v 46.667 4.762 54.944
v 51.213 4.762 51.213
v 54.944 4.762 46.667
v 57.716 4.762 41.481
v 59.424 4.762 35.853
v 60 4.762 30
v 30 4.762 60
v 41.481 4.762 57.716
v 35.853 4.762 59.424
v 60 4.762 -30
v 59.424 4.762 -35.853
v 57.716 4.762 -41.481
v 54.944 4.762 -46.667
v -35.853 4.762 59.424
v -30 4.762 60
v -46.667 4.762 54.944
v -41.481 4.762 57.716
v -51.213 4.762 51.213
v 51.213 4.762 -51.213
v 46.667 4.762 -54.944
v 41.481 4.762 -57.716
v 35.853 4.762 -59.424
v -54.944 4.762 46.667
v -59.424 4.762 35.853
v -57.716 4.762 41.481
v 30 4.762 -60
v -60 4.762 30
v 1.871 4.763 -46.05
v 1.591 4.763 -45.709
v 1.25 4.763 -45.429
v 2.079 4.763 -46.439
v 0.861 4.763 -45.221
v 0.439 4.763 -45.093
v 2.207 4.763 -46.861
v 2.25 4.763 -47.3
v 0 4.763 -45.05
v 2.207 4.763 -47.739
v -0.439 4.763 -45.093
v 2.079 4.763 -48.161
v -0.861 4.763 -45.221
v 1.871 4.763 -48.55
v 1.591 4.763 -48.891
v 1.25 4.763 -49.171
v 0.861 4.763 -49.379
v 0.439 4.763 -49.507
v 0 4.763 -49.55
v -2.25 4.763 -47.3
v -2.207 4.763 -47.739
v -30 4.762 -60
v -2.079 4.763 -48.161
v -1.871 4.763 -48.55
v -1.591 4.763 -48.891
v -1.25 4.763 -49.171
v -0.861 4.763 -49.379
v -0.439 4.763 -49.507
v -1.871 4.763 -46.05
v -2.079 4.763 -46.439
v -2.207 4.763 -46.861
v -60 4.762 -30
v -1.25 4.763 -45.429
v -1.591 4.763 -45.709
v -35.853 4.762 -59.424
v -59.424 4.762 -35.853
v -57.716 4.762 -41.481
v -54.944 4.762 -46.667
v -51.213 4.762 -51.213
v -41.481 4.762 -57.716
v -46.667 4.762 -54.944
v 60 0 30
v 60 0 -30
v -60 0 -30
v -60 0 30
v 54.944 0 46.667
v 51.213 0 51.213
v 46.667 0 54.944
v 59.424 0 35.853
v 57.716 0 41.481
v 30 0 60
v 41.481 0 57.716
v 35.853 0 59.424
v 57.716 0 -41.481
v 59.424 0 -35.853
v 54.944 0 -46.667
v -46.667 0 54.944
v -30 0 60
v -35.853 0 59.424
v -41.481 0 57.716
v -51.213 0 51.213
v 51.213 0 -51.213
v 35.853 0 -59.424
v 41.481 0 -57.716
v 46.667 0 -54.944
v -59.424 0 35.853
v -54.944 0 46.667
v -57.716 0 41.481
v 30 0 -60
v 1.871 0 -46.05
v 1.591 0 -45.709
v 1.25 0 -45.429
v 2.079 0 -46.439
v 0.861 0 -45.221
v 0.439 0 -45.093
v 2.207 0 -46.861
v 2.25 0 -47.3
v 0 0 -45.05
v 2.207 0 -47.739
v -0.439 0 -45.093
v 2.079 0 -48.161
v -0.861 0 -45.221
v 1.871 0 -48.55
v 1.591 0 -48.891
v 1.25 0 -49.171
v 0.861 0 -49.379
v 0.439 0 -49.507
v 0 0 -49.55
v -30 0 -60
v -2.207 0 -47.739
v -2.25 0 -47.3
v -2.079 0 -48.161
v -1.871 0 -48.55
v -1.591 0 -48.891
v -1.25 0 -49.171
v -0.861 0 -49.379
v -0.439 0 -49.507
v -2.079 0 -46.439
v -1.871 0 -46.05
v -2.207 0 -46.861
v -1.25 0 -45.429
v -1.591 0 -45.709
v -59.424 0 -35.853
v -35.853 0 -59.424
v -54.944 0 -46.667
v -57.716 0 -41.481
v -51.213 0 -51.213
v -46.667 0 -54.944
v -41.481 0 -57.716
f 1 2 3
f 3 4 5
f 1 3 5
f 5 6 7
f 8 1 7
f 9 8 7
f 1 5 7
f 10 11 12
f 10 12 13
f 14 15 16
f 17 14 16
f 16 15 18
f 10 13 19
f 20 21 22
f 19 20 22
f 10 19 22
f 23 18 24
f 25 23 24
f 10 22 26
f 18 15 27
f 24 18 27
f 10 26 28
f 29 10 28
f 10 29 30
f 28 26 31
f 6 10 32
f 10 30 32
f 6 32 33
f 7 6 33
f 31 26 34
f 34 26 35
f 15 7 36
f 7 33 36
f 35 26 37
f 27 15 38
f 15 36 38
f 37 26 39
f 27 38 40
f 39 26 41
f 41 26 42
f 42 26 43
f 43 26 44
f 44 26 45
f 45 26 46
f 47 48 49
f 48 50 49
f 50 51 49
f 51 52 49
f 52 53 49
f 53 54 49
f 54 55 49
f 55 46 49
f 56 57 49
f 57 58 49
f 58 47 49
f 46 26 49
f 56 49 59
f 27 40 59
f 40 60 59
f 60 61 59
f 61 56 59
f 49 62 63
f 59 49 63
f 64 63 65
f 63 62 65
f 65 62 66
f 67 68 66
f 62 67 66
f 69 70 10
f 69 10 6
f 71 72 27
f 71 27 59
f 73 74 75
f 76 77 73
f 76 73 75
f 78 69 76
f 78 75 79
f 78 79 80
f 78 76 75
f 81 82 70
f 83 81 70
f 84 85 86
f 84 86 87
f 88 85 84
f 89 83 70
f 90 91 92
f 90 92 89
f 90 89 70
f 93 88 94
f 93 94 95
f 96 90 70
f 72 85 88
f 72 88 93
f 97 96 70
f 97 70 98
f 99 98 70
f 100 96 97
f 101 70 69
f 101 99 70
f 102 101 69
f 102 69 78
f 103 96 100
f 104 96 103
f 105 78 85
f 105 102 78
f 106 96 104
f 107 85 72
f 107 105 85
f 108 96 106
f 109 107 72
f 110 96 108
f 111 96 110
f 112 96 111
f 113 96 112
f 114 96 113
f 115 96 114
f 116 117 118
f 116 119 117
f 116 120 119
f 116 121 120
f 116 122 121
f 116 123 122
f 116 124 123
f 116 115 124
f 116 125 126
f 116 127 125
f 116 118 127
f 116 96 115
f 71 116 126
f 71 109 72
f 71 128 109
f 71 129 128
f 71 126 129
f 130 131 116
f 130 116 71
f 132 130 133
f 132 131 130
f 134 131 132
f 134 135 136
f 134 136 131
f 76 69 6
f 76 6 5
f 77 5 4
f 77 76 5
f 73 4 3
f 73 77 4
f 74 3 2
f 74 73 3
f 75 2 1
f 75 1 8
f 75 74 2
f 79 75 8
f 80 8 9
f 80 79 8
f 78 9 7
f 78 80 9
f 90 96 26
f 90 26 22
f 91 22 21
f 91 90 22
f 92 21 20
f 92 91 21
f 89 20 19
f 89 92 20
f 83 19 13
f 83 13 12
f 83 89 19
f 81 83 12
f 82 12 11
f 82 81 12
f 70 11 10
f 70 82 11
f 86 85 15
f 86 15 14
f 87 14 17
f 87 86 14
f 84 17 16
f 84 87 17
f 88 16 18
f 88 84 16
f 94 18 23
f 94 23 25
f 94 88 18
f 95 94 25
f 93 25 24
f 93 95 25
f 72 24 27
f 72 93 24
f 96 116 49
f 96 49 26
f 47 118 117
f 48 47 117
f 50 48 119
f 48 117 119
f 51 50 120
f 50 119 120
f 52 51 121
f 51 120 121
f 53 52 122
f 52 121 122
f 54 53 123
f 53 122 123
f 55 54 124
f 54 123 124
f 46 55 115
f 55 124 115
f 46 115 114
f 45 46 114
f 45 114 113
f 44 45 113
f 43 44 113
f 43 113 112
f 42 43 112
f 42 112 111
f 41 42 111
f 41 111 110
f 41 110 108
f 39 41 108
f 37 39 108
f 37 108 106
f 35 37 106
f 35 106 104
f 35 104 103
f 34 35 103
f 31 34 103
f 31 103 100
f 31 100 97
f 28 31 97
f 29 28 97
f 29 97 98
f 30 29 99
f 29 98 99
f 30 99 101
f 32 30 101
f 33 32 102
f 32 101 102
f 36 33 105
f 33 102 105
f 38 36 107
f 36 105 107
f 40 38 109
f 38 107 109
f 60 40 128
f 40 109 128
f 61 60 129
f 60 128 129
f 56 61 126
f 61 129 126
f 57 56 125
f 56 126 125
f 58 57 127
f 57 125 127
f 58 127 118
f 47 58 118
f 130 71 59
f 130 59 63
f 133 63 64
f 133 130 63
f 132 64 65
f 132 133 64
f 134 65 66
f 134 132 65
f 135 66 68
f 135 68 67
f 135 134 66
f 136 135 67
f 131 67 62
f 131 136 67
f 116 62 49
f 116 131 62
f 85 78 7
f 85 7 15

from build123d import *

# Parameters (mm, degrees)
BOSS_EXTRUDE1_DEPTH      = 4.7625
M4_CLEARANCE_HOLE1_D     = 4.5
M4_CLEARANCE_HOLE1_DEPTH = 50
M4_CLEARANCE_HOLE1_TIP   = 1.351936393


with BuildPart() as part:
    # Sketch1 → Boss-Extrude1 (new body)
    with BuildSketch(Plane(origin=(0, 0, 0), x_dir=(1, 0, 0), z_dir=(0, 1, 0))):
        with BuildLine():
            Line((-30, 60), (30, 60))
            ThreePointArc((30, 60), (51.213203436, 51.213203436), (60, 30))
            Line((60, 30), (60, -30))
            ThreePointArc((60, -30), (51.213203436, -51.213203436), (30, -60))
            Line((30, -60), (-30, -60))
            ThreePointArc((-30, -60), (-51.213203436, -51.213203436), (-60, -30))
            Line((-60, -30), (-60, 30))
            ThreePointArc((-60, 30), (-51.213203436, 51.213203436), (-30, 60))
        make_face()
    extrude(amount=BOSS_EXTRUDE1_DEPTH)

    # M4 Clearance Hole1
    with Locations(Plane(origin=(0, 4.7625, 0), x_dir=(1, 0, 0), z_dir=(0, 1, 0))):
        with Locations((0, 47.3)):
            Hole(M4_CLEARANCE_HOLE1_D / 2, depth=M4_CLEARANCE_HOLE1_DEPTH)
            with Locations((0, 0, -(M4_CLEARANCE_HOLE1_DEPTH + M4_CLEARANCE_HOLE1_TIP / 2))):  # 118° drill point
                Cone(0, M4_CLEARANCE_HOLE1_D / 2, M4_CLEARANCE_HOLE1_TIP, mode=Mode.SUBTRACT)


solid = part.part
